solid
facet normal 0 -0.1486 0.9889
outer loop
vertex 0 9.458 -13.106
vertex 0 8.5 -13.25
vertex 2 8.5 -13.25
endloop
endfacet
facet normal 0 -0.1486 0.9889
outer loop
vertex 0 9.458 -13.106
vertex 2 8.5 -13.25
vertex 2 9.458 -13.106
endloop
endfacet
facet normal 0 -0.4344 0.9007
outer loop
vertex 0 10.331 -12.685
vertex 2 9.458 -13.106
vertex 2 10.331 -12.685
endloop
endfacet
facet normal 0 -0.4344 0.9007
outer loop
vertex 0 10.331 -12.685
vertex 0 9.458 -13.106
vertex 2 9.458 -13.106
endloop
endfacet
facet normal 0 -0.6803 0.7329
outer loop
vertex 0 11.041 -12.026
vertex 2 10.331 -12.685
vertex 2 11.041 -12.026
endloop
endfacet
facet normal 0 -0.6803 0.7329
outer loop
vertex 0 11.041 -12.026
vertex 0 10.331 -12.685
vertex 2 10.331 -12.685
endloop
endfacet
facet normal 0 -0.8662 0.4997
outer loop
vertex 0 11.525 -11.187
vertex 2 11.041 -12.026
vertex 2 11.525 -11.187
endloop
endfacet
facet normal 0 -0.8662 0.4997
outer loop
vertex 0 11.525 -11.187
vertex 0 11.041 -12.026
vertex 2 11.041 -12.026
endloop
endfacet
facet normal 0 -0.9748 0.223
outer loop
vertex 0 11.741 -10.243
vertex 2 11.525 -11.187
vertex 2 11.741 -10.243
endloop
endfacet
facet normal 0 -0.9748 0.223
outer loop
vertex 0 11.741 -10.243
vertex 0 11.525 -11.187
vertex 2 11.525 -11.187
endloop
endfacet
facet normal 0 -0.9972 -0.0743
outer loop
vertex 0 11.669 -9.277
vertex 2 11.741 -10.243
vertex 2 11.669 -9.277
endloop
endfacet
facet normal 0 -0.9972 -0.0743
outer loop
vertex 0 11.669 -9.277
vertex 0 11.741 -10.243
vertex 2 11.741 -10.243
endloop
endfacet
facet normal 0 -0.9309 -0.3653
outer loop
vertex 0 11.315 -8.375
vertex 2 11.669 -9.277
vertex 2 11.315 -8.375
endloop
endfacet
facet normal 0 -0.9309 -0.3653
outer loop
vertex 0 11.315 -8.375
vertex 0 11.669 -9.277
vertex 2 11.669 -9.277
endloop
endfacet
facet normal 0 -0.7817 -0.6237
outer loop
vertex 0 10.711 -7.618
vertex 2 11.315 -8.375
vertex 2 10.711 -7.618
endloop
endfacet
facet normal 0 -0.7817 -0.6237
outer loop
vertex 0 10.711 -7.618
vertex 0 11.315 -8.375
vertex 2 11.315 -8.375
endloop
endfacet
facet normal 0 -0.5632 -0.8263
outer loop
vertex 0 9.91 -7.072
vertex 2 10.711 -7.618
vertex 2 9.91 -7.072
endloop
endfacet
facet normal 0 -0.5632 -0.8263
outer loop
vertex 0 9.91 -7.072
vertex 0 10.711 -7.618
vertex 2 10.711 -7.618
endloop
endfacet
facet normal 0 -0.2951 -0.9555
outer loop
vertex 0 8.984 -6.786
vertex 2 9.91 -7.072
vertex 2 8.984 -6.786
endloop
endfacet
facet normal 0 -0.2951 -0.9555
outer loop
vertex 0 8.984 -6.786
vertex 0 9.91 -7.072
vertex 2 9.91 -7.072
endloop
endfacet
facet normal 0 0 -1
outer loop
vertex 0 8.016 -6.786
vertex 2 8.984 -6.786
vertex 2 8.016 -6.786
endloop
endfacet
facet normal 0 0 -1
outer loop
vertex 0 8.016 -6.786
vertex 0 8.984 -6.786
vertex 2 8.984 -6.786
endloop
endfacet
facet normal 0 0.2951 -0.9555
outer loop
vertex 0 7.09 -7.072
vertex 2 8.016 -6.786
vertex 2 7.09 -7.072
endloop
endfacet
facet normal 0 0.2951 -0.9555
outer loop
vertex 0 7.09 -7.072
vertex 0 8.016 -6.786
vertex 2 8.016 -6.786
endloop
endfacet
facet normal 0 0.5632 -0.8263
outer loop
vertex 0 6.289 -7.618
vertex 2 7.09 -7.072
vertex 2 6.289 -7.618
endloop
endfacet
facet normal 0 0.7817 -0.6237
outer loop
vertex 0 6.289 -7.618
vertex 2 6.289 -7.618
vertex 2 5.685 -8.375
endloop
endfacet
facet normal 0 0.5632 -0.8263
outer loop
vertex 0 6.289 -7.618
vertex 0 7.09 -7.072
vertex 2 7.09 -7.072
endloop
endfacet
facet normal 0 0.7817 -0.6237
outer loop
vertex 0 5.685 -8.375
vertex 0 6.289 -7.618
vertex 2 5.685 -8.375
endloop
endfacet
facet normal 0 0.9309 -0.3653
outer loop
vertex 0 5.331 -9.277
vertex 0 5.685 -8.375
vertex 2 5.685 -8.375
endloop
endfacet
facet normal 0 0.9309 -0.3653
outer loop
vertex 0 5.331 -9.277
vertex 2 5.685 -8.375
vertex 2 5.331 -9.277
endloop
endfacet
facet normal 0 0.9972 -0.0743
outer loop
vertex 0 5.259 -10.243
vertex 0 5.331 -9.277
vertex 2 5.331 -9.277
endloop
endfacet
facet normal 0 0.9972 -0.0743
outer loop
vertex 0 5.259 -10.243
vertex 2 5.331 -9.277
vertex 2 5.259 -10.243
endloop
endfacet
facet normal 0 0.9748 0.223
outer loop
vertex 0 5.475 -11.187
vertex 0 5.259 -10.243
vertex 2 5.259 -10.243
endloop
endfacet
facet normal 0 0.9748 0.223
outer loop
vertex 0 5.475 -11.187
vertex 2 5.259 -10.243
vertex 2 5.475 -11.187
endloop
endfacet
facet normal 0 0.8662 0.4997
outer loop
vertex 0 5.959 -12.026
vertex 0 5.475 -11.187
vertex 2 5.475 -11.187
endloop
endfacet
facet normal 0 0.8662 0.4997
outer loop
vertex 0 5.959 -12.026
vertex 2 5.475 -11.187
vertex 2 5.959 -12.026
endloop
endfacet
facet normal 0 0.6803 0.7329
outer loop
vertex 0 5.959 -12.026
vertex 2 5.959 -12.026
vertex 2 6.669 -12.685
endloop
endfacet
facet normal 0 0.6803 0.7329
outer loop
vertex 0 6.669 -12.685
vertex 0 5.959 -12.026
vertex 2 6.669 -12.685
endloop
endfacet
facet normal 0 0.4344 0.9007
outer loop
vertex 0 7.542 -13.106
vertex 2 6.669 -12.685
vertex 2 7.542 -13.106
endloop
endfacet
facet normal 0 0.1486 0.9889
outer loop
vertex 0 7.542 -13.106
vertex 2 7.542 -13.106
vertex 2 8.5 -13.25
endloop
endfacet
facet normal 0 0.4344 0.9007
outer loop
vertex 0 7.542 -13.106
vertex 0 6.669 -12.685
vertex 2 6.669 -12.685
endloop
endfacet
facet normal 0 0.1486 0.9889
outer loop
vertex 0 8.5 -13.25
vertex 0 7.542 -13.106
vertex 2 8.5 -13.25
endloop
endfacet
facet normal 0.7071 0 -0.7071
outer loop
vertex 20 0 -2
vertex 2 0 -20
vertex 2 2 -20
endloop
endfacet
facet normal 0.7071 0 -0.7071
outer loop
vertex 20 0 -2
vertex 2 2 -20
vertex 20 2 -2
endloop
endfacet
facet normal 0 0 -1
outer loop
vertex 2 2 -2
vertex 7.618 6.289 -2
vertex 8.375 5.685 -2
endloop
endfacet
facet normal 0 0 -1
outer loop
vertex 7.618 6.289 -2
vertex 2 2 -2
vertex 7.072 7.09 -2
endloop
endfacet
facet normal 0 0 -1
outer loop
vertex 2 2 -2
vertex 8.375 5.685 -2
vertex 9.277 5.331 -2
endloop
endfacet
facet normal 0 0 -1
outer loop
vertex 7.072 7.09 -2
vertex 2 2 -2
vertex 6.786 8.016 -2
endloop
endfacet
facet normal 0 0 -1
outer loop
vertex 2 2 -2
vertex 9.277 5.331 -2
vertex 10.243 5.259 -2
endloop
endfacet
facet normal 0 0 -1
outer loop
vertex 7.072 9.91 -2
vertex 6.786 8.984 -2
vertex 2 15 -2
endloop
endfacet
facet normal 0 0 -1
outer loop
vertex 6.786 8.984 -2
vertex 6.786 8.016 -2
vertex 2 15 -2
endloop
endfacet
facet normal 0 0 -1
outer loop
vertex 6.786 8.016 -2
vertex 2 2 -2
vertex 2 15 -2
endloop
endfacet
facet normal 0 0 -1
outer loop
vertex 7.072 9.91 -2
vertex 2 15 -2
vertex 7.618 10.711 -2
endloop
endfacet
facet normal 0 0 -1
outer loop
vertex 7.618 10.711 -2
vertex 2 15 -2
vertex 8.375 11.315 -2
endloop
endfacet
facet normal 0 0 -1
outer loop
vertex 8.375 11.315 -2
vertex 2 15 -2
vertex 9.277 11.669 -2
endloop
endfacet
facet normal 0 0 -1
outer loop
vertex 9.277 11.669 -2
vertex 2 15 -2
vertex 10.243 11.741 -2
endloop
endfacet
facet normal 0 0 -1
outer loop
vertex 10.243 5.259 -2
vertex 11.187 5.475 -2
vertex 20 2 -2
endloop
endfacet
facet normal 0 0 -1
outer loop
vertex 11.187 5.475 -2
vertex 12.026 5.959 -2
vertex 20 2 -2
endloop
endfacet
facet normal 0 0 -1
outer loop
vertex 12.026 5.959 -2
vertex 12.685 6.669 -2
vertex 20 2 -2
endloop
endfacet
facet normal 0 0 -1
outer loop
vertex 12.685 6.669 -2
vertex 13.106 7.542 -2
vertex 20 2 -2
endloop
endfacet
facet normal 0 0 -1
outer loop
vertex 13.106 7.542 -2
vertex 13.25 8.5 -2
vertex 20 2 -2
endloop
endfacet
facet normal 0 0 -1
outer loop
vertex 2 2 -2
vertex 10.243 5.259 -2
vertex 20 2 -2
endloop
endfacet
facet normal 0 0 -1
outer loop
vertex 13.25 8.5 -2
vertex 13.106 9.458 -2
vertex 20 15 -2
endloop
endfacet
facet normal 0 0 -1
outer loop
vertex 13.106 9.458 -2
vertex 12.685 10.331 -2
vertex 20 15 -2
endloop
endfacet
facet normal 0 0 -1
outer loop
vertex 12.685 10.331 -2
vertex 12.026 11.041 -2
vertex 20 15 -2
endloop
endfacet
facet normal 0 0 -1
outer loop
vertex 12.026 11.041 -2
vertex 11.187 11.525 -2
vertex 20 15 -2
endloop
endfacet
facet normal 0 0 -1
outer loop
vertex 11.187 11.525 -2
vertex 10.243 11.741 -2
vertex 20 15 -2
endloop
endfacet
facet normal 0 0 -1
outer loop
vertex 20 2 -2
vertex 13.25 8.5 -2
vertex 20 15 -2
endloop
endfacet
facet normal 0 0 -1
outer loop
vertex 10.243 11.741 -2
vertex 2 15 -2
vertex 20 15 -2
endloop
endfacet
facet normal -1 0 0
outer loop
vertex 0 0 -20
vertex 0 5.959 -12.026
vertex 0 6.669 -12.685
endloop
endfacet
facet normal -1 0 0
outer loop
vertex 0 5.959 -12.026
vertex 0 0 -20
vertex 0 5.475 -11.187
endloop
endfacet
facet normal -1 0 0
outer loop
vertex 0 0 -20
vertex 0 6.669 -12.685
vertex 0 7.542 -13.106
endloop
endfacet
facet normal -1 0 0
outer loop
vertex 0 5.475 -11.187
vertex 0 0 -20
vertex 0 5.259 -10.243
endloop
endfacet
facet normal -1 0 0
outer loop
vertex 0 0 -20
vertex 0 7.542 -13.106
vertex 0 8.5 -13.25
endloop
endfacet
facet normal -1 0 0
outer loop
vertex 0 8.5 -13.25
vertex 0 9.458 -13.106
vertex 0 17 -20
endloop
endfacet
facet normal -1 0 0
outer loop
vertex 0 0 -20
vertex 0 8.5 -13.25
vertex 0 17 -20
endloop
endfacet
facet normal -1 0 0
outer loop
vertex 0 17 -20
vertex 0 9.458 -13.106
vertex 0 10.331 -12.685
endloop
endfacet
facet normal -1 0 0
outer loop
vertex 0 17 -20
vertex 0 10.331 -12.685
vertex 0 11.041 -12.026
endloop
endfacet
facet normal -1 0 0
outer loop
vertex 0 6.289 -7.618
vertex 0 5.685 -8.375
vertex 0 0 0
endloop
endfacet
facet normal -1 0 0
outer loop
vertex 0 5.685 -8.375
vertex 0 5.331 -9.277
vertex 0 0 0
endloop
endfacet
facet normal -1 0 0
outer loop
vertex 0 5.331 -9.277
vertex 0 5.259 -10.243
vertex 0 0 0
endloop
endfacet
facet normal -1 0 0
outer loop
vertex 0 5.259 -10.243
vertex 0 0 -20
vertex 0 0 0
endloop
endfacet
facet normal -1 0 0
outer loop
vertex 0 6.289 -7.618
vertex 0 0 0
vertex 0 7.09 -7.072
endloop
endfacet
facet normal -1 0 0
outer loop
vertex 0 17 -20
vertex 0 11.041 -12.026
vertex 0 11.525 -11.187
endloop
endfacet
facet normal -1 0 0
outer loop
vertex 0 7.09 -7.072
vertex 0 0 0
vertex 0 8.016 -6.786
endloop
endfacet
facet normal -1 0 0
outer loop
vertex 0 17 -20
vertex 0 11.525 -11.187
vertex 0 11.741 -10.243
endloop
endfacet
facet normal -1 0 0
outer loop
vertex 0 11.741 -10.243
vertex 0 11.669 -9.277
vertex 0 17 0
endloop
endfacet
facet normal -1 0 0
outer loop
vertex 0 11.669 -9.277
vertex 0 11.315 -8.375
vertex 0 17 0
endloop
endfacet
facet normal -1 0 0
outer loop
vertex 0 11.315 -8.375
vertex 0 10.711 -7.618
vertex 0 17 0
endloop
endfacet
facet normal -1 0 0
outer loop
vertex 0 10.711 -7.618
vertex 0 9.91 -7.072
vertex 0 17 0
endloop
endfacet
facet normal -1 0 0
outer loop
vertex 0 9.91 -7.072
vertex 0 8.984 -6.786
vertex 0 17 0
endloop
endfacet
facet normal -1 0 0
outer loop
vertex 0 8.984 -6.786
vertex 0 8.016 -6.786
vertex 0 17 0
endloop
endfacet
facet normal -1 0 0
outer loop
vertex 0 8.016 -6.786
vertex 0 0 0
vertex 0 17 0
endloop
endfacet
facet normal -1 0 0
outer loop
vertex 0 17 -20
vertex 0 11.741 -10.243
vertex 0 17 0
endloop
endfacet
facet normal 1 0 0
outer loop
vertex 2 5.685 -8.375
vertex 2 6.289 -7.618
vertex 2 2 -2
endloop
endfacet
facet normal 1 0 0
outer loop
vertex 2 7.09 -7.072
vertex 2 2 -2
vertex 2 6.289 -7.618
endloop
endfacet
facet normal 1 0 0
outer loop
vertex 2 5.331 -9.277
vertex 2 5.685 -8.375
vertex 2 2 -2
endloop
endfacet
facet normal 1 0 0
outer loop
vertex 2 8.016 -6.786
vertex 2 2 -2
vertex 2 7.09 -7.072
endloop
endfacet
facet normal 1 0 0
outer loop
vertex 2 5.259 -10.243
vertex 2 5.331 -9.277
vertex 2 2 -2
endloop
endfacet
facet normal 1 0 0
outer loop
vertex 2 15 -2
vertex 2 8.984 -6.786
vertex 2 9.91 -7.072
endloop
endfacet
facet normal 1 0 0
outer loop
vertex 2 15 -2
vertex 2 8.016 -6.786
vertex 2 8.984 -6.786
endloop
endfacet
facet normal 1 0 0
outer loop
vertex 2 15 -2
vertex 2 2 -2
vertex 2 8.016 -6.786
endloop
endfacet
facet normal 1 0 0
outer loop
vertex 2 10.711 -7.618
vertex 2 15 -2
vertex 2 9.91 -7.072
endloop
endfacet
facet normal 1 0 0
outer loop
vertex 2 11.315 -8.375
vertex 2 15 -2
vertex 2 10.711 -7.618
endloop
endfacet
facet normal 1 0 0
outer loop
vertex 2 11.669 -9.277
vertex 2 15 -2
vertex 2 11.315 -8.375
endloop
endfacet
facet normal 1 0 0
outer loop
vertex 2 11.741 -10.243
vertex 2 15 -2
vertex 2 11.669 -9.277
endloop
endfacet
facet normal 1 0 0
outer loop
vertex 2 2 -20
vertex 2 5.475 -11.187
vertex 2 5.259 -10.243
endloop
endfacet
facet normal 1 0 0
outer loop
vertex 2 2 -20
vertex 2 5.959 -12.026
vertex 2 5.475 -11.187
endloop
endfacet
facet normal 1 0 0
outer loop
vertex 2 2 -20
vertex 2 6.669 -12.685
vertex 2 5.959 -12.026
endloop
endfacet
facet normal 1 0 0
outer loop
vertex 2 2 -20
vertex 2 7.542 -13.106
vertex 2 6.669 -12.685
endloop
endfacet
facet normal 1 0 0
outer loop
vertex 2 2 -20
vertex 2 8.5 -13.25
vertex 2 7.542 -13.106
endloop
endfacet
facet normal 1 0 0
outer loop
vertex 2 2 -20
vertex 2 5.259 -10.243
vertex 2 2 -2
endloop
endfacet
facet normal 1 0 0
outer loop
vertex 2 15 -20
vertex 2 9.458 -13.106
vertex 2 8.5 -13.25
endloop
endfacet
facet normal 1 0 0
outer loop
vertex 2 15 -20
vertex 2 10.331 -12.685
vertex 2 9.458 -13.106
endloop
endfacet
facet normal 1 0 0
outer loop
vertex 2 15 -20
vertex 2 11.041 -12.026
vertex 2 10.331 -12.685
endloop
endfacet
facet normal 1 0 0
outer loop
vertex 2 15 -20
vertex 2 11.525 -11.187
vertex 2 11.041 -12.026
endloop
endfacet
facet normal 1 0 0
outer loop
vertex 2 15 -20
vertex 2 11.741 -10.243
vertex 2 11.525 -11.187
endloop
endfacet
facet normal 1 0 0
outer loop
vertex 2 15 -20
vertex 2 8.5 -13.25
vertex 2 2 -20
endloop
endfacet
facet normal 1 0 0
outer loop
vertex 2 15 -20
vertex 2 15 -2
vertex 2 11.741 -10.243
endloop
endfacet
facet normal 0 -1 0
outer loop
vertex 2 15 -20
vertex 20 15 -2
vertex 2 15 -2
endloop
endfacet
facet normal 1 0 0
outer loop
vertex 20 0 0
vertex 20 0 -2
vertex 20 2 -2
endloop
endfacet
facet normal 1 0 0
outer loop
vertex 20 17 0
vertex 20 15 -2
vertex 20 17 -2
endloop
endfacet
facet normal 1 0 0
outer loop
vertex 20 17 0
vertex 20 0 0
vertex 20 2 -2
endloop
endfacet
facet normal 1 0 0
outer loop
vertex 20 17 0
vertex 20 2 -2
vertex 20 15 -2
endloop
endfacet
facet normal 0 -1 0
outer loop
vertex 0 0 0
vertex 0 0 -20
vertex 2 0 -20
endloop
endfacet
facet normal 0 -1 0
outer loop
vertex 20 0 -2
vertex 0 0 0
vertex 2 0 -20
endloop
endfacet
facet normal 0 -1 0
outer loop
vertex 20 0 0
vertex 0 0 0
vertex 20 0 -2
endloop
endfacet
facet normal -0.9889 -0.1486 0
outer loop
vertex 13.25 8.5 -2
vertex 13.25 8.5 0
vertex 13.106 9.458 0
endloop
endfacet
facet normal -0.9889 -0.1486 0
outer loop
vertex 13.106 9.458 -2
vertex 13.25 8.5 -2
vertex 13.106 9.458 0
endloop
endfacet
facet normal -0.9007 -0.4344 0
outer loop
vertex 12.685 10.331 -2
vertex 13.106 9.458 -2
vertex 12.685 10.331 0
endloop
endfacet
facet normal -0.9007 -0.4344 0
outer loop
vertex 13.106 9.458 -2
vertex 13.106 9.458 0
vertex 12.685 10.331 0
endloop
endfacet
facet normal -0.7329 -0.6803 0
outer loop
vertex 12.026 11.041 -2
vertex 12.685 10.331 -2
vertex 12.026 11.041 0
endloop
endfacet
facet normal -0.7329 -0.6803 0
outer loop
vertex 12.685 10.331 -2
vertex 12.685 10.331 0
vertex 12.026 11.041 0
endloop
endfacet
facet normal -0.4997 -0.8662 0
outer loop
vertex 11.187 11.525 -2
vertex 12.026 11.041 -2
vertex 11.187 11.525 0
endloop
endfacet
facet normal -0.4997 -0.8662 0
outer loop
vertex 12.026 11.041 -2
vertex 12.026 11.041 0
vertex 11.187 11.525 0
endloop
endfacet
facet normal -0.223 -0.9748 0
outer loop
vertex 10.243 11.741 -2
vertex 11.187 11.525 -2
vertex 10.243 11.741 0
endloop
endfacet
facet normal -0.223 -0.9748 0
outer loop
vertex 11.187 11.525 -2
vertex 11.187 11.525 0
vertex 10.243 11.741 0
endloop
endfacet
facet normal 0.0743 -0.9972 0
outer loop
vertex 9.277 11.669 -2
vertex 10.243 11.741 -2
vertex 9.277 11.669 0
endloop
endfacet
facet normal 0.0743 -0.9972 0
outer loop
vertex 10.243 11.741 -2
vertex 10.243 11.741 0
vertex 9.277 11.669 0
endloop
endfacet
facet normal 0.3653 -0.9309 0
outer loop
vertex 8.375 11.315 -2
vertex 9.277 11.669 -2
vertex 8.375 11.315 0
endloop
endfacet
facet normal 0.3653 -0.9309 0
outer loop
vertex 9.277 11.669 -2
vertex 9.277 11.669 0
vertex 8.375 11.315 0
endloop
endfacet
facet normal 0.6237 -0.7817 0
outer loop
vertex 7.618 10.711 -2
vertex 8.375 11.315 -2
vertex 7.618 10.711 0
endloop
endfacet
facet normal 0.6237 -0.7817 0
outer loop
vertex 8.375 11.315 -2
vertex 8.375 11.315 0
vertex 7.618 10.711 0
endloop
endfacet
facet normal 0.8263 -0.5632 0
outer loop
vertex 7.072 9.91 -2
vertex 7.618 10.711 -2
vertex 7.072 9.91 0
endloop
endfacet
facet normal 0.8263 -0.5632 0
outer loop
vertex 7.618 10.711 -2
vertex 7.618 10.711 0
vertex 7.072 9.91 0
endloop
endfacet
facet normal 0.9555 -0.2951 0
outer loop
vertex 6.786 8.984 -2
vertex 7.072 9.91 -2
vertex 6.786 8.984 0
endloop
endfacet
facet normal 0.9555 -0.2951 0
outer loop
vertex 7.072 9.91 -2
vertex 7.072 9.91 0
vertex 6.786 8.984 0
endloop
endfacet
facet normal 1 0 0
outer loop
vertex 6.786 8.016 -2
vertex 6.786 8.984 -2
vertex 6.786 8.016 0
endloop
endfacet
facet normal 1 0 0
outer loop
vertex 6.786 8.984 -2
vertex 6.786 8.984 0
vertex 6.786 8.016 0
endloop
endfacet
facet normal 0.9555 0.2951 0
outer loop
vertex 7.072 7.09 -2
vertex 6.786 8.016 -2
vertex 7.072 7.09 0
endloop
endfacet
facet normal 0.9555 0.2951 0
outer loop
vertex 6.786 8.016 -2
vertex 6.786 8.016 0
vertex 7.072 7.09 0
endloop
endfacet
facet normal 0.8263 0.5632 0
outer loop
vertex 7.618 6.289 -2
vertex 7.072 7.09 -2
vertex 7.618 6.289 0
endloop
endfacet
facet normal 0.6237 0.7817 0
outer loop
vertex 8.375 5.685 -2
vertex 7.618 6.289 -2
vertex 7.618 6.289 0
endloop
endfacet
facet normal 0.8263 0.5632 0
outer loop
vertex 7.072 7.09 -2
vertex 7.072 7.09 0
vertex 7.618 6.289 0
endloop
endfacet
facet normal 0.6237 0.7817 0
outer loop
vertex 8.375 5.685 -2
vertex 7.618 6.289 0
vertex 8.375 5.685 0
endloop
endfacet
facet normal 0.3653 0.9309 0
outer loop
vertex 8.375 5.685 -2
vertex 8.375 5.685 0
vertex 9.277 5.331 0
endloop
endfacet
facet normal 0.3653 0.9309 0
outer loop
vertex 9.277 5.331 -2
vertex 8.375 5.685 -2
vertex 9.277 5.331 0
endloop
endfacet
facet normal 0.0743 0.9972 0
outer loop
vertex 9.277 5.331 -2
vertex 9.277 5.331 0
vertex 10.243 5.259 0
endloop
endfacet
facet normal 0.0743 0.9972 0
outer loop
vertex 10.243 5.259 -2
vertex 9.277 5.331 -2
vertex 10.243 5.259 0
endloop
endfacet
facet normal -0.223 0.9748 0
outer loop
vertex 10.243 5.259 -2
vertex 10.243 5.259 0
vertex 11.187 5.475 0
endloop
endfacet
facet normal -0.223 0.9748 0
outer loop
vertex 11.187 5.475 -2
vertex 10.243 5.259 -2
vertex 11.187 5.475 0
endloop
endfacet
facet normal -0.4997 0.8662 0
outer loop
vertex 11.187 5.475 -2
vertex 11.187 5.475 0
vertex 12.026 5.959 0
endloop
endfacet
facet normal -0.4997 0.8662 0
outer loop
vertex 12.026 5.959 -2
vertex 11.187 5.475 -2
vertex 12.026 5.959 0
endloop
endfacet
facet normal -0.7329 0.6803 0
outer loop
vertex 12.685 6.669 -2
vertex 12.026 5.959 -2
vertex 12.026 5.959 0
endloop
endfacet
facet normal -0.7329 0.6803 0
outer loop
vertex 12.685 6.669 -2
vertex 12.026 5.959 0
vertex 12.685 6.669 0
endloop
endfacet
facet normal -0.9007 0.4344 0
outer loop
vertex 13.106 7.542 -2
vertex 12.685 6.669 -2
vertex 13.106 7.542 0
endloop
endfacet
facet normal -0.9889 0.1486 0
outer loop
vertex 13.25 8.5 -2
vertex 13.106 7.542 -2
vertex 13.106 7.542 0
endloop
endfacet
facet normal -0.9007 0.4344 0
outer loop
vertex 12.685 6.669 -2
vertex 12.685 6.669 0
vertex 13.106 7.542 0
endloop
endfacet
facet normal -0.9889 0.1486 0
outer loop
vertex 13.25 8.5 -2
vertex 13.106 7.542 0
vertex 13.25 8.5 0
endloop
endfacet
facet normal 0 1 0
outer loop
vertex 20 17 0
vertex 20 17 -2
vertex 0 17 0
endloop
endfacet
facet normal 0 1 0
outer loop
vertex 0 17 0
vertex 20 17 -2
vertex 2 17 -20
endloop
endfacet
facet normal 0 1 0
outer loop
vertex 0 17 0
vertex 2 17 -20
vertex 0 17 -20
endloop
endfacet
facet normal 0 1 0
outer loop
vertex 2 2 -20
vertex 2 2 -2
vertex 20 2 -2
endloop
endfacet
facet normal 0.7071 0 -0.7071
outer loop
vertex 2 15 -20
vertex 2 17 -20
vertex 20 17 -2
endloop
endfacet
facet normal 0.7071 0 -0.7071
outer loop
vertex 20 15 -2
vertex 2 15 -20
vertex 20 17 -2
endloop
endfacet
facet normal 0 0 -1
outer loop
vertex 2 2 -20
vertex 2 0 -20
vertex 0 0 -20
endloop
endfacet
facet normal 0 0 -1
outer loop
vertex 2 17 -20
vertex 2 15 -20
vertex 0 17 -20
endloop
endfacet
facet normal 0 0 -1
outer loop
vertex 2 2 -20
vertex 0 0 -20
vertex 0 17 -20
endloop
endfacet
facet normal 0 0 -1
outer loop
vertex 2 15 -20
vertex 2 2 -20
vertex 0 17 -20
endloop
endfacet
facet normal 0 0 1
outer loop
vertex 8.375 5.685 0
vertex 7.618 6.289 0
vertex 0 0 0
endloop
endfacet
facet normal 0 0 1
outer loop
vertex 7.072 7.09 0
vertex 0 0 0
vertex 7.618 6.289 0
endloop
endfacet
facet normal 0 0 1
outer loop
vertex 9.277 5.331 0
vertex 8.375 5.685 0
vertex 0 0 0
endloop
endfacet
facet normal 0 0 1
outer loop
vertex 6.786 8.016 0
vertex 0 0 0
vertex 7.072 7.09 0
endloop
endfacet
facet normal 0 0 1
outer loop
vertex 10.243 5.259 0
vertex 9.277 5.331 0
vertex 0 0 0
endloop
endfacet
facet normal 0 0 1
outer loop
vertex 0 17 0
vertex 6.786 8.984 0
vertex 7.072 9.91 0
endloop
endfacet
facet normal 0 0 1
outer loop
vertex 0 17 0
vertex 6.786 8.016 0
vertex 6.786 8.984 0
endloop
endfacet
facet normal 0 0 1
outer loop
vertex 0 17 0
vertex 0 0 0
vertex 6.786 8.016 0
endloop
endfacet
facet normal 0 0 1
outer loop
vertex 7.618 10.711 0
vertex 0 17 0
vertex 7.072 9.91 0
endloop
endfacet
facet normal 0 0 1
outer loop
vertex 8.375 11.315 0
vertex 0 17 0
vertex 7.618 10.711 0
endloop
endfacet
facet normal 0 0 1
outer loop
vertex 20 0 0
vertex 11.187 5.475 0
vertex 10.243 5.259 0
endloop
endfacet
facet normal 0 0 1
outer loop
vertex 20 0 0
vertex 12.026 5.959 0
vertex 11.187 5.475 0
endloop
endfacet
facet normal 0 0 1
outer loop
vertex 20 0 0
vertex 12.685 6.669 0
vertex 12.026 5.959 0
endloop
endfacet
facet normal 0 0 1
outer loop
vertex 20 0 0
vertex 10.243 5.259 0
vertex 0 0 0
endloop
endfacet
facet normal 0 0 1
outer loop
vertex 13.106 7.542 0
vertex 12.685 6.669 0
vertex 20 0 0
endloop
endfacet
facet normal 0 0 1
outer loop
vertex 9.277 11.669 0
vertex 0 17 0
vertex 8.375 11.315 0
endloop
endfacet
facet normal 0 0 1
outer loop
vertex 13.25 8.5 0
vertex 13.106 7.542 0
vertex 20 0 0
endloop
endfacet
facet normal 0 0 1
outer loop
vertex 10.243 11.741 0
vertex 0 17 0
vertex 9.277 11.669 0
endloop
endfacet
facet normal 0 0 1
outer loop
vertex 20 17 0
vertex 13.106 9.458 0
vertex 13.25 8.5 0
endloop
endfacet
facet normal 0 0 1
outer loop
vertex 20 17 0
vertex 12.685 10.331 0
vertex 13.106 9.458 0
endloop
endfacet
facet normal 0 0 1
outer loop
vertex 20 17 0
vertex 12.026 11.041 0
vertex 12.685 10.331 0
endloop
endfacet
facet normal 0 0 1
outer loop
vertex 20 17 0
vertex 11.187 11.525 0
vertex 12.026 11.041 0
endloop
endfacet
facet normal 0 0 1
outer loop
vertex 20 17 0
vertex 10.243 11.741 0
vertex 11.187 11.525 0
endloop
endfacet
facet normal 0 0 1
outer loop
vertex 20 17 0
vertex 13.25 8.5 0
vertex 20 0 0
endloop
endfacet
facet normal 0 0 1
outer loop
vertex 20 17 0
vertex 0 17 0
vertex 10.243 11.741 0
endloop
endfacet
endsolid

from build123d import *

# Parameters (mm, degrees)
SKETCH1_W           = 20
SKETCH1_H           = 17
SKETCH1_R           = 3.25
BOSS_EXTRUDE1_DEPTH = 2
SKETCH2_W           = 20
SKETCH2_H           = 17
SKETCH2_R           = 3.25
BOSS_EXTRUDE2_DEPTH = 2
BOSS_EXTRUDE3_DEPTH = 2
BOSS_EXTRUDE4_DEPTH = 2


with BuildPart() as part:
    # Sketch1 → Boss-Extrude1 (new body)
    with BuildSketch(Plane.XY):
        with Locations((10, 8.5)):
            Rectangle(SKETCH1_W, SKETCH1_H)
        with Locations((10, 8.5)):
            Circle(SKETCH1_R, mode=Mode.SUBTRACT)
    extrude(amount=-BOSS_EXTRUDE1_DEPTH)

    # Sketch2 → Boss-Extrude2 (add)
    with BuildSketch(Plane(origin=(0, 0, 0), x_dir=(0, 0, -1), z_dir=(1, 0, 0))):
        with Locations((10, 8.5)):
            Rectangle(SKETCH2_W, SKETCH2_H)
        with Locations((10, 8.5)):
            Circle(SKETCH2_R, mode=Mode.SUBTRACT)
    extrude(amount=BOSS_EXTRUDE2_DEPTH)

    # Sketch3 → Boss-Extrude3 (add)
    with BuildSketch(Plane(origin=(0, 17, 0), x_dir=(1, 0, 0), z_dir=(0, 1, 0))):
        Polygon((2, 20), (20, 2), (2, 2), align=None)
    extrude(amount=-BOSS_EXTRUDE3_DEPTH)

    # Sketch4 → Boss-Extrude4 (add)
    with BuildSketch(Plane.XZ):
        Polygon((2, -20), (20, -2), (2, -2), align=None)
    extrude(amount=-BOSS_EXTRUDE4_DEPTH)


solid = part.part
